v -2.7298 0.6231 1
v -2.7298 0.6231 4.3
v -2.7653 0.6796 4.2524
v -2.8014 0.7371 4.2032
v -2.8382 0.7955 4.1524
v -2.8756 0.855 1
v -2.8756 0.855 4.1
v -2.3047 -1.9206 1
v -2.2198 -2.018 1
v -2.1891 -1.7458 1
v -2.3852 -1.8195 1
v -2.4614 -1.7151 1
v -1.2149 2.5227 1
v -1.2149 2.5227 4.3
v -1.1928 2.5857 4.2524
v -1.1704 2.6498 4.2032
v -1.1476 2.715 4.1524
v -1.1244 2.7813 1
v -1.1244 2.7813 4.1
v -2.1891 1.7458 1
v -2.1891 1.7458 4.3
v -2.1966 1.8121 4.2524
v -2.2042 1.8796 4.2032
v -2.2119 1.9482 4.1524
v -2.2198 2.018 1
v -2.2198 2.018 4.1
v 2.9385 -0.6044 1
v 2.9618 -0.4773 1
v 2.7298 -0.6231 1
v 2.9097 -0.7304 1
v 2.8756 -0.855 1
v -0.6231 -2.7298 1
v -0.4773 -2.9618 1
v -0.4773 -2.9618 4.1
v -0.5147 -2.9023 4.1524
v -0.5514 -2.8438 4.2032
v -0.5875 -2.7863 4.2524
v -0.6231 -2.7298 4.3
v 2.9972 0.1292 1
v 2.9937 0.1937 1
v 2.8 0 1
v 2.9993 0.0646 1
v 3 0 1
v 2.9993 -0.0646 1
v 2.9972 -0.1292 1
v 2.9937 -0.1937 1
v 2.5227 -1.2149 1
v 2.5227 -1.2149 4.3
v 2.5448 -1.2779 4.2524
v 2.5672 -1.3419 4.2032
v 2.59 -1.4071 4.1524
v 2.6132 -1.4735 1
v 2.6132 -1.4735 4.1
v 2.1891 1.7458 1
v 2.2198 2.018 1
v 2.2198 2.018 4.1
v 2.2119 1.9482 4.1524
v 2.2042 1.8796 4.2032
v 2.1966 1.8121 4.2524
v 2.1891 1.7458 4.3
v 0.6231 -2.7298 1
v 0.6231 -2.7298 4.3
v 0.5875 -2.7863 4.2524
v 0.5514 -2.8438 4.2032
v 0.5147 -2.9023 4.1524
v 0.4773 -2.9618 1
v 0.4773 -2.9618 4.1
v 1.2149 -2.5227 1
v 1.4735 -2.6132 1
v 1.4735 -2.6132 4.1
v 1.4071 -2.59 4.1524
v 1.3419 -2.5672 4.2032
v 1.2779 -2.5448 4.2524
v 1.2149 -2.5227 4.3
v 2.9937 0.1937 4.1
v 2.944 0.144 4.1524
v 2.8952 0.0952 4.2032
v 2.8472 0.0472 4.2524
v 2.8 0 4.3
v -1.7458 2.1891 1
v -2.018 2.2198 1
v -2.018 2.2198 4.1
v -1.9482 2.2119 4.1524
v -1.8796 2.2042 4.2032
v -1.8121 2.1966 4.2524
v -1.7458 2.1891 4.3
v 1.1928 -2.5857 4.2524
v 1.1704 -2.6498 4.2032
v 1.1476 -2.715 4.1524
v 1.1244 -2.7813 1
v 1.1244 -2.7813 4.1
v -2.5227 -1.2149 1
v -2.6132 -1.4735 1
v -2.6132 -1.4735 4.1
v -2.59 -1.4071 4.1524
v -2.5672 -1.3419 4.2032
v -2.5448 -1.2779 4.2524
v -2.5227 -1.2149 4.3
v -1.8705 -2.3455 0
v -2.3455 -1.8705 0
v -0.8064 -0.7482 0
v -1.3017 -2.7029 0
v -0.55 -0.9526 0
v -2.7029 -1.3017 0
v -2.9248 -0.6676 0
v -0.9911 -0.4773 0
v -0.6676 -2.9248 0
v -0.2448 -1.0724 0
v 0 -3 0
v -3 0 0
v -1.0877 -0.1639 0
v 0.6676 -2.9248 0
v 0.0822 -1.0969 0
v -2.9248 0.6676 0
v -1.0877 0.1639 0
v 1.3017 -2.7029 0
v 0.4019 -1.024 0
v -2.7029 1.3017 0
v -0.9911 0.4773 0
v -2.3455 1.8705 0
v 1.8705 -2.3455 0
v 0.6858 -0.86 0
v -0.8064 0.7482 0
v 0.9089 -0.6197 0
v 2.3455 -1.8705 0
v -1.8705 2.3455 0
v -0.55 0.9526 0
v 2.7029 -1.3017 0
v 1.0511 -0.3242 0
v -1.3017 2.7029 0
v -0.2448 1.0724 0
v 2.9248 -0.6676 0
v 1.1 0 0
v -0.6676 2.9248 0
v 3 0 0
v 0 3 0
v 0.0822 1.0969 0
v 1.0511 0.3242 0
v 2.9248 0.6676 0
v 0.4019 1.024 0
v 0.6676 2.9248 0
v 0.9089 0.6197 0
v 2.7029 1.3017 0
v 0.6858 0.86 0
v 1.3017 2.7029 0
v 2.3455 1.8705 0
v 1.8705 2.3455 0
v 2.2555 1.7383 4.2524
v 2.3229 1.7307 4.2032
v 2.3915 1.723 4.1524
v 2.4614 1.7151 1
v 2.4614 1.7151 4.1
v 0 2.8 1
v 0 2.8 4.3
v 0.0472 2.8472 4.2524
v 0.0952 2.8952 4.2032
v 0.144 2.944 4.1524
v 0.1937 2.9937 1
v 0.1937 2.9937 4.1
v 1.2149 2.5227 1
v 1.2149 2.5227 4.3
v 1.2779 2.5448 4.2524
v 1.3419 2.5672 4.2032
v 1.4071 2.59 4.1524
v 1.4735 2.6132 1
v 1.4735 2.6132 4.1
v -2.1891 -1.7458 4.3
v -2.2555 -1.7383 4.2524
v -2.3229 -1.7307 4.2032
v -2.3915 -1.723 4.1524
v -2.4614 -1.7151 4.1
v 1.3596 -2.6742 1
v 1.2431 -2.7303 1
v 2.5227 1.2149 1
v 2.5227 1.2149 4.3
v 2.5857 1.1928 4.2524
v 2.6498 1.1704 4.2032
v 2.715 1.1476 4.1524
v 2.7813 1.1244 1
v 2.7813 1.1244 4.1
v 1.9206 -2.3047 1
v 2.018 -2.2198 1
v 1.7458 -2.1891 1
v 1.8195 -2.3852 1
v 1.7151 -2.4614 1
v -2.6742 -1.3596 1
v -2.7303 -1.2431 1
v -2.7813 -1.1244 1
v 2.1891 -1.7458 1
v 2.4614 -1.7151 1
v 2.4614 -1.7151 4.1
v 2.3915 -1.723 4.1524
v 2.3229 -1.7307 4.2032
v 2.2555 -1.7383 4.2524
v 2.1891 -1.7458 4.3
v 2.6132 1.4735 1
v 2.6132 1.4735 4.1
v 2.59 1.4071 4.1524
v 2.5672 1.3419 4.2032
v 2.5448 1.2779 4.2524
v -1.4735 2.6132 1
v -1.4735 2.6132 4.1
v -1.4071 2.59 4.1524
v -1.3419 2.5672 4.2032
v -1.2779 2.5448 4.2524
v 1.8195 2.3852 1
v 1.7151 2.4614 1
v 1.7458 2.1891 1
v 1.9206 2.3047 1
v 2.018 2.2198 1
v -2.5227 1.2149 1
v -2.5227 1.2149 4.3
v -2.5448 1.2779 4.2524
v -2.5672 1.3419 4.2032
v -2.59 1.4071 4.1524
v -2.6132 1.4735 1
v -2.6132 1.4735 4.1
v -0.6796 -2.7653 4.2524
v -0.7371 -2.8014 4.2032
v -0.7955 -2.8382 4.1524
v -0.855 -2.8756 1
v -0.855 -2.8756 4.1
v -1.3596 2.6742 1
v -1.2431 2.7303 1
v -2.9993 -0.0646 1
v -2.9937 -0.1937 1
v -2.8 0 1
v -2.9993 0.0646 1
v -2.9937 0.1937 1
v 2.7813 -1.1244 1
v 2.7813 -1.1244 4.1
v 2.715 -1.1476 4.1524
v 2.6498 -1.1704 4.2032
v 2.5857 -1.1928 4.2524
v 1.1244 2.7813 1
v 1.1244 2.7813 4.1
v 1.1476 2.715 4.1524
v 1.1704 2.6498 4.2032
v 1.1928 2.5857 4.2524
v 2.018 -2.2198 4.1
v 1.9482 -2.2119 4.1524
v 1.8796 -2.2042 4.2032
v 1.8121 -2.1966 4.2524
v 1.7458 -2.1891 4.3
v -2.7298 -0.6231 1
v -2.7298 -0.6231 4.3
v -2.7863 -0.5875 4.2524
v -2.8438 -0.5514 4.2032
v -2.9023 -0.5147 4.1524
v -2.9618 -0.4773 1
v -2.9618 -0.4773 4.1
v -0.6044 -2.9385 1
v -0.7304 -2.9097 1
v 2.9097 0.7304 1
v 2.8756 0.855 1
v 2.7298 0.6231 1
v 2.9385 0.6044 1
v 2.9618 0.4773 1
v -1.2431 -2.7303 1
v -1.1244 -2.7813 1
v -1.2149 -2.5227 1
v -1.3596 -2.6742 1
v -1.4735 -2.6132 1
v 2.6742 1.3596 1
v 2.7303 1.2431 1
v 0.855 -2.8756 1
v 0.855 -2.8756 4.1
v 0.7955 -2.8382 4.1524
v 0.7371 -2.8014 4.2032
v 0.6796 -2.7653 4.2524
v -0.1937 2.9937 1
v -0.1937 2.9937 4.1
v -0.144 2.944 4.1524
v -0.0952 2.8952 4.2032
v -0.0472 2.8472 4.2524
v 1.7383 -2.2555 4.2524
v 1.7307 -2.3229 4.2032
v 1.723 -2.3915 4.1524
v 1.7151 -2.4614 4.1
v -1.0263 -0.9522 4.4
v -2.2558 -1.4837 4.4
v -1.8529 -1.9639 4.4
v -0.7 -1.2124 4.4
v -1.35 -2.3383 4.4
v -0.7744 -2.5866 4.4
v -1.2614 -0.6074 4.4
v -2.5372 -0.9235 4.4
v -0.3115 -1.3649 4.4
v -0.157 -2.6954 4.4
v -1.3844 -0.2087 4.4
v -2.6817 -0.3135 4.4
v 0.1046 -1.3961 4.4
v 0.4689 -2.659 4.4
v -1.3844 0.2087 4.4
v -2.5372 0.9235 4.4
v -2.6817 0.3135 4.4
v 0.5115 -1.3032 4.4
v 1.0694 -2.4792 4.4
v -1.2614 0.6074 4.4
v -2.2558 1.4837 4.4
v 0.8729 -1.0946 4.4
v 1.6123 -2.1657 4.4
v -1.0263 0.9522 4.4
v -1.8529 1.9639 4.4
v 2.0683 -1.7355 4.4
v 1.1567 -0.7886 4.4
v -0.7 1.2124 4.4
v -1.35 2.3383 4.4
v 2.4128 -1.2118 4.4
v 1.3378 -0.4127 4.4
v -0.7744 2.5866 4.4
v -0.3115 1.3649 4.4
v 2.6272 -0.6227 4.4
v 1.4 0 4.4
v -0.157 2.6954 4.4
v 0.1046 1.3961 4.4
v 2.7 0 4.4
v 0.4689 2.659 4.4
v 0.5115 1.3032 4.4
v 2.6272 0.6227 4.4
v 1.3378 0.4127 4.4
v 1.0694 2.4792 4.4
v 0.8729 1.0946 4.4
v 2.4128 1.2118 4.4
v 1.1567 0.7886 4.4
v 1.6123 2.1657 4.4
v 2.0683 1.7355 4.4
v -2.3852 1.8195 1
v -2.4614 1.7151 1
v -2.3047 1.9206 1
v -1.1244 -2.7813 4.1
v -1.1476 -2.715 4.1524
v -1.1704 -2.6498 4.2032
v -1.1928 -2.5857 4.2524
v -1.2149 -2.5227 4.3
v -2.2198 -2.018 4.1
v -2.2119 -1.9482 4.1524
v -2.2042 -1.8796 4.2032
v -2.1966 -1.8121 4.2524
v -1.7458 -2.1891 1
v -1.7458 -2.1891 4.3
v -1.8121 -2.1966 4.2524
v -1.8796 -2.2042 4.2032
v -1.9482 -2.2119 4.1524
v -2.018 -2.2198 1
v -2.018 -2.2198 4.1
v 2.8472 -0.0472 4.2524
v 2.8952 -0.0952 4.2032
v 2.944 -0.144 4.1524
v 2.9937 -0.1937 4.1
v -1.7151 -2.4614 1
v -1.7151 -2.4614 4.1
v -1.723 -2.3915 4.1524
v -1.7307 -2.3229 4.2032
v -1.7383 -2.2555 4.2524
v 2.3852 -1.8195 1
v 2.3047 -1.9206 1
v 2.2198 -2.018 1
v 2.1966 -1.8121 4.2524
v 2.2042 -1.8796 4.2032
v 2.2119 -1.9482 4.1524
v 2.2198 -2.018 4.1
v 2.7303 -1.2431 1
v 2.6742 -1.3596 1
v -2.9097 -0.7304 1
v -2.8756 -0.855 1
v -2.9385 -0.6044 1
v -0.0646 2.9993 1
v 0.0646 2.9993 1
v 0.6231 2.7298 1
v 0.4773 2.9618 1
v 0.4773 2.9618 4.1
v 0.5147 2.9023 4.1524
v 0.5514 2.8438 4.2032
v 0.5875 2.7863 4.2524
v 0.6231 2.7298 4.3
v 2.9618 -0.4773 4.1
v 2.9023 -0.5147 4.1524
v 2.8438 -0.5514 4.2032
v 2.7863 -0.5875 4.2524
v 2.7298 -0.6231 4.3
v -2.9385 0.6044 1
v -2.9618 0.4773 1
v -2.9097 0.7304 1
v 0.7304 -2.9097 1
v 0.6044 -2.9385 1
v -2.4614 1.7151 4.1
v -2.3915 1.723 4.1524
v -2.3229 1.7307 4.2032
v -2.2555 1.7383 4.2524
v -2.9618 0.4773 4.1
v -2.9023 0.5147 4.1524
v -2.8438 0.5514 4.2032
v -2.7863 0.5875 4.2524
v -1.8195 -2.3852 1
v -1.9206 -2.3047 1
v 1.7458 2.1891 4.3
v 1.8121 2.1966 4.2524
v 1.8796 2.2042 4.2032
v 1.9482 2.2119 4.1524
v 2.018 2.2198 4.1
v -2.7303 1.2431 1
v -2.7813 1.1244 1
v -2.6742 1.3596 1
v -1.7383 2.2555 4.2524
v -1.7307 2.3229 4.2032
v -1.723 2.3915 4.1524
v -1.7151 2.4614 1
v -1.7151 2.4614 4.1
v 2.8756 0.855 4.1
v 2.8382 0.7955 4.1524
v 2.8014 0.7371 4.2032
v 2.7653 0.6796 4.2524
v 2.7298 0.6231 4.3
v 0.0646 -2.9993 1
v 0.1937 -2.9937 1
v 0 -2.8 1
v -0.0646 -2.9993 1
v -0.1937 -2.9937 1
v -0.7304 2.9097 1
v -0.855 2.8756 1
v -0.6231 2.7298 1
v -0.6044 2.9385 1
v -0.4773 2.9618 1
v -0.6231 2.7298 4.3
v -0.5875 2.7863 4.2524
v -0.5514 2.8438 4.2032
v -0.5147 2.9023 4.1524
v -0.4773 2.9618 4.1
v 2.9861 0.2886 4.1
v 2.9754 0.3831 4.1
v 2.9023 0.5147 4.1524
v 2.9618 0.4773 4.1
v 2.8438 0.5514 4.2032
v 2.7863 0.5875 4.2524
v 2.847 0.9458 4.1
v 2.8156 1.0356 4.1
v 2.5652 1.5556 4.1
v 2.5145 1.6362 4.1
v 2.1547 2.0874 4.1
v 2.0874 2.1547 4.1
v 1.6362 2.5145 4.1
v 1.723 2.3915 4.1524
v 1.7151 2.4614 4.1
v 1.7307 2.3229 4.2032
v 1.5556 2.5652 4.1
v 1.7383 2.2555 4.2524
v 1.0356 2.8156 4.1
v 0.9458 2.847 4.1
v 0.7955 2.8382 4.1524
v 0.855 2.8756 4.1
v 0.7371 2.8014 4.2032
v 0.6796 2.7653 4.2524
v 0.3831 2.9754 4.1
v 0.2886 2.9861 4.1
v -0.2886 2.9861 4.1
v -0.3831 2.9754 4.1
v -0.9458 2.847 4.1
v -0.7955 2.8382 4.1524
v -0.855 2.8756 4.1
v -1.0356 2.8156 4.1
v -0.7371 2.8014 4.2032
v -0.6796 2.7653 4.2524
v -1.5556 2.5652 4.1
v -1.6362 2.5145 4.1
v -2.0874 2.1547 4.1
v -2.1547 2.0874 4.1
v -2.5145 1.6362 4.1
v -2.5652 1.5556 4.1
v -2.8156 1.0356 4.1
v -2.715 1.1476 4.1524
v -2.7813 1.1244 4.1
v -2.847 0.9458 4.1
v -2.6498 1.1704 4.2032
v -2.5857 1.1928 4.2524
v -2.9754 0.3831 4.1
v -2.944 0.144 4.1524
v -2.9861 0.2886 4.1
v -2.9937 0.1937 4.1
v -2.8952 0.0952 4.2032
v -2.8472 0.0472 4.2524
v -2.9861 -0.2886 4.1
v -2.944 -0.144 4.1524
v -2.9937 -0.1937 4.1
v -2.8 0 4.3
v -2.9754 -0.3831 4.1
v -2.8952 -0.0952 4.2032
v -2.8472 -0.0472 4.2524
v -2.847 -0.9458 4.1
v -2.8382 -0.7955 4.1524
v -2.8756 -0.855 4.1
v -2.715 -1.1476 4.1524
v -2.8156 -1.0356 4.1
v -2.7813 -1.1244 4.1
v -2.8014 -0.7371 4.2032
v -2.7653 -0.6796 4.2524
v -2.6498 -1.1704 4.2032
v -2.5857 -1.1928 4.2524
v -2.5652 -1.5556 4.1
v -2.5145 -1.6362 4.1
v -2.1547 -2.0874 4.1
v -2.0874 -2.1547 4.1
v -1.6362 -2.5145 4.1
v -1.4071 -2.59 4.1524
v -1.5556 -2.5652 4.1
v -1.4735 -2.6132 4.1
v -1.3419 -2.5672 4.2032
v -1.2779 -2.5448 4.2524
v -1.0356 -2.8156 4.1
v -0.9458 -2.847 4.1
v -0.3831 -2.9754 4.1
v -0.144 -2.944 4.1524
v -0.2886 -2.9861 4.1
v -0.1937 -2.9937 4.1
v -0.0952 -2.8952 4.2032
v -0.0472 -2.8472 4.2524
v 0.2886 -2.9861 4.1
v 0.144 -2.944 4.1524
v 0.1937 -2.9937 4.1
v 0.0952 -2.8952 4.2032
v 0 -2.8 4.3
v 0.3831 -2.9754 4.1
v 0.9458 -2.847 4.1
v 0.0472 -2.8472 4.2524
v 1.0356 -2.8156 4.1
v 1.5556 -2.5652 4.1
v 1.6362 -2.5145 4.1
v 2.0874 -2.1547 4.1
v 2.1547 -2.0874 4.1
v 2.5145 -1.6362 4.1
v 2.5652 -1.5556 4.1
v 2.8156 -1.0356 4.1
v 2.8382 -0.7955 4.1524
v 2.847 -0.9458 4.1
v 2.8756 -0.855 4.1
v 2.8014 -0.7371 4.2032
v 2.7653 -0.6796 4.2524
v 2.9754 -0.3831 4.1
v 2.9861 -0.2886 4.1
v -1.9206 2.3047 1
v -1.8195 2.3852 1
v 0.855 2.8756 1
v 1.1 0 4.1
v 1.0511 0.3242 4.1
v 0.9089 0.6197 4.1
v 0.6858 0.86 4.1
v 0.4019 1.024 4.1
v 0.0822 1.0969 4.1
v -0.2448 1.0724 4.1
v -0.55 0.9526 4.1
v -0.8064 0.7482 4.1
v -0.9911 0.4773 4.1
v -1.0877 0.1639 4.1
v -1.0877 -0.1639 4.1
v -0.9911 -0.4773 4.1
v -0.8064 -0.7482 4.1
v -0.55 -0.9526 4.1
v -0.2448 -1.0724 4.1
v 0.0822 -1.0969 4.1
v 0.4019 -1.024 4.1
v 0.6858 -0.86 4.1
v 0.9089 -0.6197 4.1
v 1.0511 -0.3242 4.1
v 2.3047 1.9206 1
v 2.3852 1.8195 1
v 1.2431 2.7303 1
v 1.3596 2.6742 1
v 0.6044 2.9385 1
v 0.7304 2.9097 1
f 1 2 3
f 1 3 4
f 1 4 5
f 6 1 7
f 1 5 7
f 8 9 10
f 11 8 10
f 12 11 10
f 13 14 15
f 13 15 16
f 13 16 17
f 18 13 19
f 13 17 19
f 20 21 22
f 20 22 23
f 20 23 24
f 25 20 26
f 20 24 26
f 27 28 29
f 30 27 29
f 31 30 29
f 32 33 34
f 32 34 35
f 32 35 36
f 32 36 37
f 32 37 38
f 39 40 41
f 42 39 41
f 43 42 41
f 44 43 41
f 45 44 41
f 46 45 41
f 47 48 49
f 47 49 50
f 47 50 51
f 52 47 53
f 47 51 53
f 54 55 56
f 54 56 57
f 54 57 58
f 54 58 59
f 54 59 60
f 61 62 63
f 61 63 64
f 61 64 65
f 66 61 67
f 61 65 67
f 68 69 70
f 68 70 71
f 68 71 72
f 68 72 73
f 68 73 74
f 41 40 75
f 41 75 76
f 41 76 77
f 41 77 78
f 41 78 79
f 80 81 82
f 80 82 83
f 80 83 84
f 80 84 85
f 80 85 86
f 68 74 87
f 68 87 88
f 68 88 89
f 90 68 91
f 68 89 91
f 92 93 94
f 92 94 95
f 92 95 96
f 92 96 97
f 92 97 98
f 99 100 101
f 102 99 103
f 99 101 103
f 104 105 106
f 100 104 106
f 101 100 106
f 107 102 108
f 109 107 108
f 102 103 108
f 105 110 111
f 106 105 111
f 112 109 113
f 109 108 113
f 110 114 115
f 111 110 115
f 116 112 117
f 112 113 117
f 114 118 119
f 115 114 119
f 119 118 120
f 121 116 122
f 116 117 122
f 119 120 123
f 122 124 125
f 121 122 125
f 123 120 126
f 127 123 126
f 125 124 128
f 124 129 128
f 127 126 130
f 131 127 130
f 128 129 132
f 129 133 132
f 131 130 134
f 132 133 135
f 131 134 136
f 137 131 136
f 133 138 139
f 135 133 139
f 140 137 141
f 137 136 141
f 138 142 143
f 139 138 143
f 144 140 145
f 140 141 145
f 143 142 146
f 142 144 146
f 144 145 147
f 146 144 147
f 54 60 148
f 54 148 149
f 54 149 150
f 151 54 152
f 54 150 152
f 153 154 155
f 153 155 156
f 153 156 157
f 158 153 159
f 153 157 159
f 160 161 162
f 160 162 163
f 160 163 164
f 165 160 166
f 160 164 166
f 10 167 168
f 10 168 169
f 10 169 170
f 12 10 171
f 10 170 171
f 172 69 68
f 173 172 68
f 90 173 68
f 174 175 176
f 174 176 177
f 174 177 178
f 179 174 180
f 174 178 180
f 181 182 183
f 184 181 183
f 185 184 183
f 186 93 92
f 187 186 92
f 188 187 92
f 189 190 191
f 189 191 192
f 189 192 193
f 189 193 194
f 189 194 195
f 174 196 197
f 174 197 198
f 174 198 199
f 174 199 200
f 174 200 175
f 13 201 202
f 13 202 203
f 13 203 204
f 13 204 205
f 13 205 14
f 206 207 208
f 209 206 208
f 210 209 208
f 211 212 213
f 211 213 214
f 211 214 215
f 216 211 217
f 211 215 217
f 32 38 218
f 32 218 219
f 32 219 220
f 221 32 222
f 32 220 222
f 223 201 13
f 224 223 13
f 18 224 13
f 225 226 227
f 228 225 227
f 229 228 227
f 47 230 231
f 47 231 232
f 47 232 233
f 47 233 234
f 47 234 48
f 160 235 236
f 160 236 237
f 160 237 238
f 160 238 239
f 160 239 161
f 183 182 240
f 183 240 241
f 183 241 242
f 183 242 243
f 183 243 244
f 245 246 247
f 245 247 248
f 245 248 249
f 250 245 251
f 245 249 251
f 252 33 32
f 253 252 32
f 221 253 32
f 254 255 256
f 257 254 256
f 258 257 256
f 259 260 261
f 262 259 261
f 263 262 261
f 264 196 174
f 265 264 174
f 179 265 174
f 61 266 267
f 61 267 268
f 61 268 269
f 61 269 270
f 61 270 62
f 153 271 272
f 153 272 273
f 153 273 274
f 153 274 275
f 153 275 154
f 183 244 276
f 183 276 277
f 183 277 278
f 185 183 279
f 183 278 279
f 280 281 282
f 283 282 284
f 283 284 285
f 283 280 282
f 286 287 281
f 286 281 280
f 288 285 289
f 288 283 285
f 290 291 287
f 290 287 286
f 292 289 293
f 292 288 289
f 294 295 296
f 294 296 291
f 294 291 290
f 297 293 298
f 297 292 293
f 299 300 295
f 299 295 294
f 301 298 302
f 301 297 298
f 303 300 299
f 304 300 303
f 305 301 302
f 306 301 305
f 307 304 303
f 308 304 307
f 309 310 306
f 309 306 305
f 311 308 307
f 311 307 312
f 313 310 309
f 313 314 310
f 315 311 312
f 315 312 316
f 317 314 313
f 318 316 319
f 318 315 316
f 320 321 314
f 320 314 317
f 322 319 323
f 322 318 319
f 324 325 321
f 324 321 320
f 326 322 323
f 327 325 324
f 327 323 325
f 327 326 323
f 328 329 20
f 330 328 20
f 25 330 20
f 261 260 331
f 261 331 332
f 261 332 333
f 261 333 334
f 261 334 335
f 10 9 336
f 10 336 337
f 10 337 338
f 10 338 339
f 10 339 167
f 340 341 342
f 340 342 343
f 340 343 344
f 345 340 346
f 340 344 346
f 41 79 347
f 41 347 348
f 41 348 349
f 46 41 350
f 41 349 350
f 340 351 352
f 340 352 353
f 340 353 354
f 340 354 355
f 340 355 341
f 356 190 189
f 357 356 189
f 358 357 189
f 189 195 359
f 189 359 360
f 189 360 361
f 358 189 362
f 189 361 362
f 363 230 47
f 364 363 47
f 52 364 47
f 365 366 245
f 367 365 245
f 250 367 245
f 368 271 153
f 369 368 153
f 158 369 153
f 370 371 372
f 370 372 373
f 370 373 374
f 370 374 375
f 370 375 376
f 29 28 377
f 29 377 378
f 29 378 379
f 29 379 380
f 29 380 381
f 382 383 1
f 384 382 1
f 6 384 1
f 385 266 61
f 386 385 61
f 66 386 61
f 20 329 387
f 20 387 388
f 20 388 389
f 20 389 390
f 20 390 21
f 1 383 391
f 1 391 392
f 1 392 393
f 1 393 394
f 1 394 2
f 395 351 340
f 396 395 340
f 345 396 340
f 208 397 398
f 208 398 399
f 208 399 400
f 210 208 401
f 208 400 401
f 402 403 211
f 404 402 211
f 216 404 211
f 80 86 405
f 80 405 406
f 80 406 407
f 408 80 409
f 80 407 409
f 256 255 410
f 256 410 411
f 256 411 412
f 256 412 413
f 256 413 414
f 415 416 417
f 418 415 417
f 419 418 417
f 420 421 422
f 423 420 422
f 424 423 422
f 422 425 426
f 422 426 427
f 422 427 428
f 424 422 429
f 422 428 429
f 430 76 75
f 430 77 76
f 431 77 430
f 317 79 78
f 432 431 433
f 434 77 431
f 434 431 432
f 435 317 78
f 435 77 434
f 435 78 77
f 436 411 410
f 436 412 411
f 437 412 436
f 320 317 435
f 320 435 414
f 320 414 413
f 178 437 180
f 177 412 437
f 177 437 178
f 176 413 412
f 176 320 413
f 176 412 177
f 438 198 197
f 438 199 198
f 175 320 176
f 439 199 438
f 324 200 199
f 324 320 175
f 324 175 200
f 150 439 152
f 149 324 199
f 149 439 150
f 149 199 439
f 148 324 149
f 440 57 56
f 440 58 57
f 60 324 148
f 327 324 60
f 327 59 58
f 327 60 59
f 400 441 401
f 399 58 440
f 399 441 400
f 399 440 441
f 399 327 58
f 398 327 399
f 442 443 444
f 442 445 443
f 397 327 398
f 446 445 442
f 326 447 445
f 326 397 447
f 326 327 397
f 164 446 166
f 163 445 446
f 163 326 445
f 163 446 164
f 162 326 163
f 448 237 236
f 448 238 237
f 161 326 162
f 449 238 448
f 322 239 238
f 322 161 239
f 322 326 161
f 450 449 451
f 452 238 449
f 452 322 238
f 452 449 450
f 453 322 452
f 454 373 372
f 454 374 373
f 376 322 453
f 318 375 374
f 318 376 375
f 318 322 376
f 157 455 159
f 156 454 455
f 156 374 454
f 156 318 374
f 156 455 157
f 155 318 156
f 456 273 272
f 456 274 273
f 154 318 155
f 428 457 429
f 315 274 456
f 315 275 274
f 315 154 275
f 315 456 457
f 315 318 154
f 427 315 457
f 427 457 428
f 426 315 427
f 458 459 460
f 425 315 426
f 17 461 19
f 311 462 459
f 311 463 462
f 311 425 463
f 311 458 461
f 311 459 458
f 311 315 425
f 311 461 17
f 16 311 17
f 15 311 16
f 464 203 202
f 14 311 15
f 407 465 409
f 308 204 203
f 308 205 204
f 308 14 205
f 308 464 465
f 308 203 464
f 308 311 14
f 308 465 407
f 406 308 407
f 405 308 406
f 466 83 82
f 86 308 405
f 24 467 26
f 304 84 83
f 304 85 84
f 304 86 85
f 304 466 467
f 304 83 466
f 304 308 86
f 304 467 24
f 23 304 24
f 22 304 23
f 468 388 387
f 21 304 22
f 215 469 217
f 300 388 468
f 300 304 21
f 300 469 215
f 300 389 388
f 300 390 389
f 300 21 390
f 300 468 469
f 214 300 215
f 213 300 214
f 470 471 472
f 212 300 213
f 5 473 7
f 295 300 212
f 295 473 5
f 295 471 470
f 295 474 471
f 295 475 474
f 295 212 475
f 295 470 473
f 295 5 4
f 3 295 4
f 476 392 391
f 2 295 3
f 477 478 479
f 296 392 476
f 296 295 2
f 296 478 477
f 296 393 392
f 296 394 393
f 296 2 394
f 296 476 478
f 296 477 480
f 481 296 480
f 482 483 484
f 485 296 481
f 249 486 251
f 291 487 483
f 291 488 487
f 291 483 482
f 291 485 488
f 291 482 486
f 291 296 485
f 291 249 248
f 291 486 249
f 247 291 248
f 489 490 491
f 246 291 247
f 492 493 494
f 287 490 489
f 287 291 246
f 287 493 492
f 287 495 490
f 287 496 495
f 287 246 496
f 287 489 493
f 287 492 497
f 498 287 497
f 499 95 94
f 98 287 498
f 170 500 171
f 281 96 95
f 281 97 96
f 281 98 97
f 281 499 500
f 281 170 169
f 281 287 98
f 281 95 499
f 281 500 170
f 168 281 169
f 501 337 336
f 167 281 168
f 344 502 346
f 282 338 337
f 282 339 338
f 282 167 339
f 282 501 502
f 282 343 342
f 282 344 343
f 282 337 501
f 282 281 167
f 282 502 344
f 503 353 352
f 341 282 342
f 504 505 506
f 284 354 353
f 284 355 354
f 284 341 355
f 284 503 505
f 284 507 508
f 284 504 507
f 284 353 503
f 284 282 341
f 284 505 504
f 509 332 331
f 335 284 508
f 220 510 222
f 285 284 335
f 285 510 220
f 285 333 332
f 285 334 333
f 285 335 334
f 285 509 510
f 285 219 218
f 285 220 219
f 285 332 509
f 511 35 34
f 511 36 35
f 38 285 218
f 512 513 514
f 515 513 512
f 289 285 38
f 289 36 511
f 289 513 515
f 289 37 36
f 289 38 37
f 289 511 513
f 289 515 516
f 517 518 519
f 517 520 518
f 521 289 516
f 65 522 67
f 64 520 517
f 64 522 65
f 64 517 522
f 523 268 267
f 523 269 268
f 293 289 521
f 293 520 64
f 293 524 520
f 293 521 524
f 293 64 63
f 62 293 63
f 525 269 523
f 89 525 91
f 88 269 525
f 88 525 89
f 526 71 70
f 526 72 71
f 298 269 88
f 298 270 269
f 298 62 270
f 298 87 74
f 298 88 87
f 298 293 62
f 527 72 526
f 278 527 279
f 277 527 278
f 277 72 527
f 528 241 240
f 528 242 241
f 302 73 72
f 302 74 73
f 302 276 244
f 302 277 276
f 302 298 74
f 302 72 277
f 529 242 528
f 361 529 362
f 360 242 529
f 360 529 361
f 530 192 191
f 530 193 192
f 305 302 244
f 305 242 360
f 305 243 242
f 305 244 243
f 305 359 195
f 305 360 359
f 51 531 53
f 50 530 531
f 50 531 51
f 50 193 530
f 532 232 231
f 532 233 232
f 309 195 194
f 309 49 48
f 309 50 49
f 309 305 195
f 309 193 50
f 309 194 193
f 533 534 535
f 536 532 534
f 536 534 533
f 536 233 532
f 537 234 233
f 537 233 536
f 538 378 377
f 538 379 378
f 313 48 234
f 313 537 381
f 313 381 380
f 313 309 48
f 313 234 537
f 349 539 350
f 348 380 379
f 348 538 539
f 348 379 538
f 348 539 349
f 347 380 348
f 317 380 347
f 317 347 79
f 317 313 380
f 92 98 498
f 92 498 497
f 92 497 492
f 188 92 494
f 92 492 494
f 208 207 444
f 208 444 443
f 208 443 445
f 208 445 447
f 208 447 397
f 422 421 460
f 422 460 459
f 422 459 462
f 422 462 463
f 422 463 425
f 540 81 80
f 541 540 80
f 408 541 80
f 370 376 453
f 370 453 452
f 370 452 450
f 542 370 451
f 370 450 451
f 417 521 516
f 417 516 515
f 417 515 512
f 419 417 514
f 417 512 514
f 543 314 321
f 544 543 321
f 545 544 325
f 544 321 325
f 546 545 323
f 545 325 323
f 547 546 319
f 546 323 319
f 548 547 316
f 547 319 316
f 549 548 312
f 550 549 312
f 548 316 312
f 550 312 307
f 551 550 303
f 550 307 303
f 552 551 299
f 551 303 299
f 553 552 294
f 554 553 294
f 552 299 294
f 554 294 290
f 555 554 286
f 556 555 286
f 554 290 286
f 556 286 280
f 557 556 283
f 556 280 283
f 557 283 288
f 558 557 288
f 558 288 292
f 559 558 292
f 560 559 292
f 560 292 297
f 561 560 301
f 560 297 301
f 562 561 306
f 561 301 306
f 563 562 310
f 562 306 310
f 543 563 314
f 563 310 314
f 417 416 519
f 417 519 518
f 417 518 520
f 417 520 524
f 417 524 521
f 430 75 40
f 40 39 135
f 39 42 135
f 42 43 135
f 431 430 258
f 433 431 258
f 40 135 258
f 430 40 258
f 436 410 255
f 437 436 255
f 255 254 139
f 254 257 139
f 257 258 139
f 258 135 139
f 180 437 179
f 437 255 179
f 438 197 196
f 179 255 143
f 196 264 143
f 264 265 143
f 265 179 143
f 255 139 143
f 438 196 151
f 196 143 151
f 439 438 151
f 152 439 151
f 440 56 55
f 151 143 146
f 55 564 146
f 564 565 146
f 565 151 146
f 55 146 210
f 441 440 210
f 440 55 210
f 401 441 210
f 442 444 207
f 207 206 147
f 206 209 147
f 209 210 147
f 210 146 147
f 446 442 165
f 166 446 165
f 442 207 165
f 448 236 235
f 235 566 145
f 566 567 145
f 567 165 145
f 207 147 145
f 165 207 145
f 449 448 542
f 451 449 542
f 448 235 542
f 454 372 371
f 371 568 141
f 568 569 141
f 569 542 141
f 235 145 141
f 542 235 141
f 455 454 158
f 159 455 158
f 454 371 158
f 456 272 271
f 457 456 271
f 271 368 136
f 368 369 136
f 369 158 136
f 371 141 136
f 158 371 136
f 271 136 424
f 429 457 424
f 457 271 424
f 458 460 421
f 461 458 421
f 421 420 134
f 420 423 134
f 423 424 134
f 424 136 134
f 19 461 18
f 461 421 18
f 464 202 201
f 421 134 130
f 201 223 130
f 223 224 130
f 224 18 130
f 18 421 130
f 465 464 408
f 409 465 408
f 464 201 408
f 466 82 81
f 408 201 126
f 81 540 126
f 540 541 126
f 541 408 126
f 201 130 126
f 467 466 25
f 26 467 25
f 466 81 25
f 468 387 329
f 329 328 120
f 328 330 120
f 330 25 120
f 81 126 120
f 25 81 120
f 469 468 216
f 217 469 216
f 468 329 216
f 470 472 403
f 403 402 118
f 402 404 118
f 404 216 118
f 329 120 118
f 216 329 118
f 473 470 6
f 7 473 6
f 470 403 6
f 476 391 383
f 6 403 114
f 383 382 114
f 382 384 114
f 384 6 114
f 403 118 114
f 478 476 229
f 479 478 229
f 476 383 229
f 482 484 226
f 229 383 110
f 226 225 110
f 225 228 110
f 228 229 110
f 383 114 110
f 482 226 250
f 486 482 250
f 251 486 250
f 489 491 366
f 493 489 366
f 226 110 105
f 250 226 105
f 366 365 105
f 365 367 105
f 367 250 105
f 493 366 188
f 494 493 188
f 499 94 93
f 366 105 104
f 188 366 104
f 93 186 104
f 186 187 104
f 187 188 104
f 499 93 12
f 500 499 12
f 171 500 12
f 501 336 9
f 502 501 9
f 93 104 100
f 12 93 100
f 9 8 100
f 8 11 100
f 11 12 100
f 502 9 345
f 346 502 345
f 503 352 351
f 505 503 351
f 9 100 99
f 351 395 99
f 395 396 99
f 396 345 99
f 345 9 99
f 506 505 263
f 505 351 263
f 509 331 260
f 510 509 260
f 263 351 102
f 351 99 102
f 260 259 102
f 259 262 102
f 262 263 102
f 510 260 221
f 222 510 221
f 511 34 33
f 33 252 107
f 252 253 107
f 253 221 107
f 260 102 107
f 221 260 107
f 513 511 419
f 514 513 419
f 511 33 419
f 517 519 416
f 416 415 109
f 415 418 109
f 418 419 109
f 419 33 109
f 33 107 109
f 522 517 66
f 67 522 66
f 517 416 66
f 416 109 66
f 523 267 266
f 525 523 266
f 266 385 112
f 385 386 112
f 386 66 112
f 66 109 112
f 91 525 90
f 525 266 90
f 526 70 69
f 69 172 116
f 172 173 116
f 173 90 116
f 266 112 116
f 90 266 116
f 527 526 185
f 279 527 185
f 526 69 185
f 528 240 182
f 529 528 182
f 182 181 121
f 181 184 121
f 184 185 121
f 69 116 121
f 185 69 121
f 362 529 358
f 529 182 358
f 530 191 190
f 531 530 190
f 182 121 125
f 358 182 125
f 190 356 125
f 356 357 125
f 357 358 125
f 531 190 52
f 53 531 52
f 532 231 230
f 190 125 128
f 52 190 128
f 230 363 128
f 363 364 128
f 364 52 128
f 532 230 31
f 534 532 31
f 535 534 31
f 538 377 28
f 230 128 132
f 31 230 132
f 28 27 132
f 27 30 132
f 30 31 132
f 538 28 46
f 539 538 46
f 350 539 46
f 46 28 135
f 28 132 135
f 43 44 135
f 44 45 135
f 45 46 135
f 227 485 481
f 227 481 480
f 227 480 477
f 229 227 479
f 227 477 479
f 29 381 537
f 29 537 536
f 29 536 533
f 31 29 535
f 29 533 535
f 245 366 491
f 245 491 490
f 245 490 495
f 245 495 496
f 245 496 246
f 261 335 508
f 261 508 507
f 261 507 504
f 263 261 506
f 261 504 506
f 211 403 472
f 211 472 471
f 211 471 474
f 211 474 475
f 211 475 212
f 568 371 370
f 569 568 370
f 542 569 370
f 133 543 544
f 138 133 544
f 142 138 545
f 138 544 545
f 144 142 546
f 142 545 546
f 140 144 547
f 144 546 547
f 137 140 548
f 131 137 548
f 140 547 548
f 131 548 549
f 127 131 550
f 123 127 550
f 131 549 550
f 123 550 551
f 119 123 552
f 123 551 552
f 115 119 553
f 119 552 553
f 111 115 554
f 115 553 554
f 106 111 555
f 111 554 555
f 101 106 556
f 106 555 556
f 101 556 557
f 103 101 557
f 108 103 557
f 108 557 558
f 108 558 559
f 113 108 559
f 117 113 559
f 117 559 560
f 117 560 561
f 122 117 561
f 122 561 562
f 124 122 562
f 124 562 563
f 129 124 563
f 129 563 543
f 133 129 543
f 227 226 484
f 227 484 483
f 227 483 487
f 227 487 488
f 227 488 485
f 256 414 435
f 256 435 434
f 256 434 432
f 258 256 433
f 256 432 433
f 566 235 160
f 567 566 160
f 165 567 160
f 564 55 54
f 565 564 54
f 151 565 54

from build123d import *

# Parameters (mm, degrees)
SKETCH026_R                 = 3
PAD002001003004001006_DEPTH = 4.4
SKETCH027_R                 = 1.1
POCKET011_DEPTH             = 4.401
CHAMFER_SIZE                = 0.3
POCKET012_DEPTH             = 3.4
POLARPATTERN_COUNT          = 28
CHAMFER001_SIZE             = 0.3


with BuildPart() as part:
    # Sketch026 → Pad002001003004001006 (new body)
    with BuildSketch(Plane.XY):
        Circle(SKETCH026_R)
    extrude(amount=PAD002001003004001006_DEPTH)

    # Sketch027 (on Face3 of Pad002001003004001006) → Pocket011 (cut, through all)
    with BuildSketch(Plane.XY.offset(4.4)):
        Circle(SKETCH027_R)
    extrude(amount=-POCKET011_DEPTH, mode=Mode.SUBTRACT)

    # Chamfer
    chamfer_edges = [part.edges().sort_by_distance(p)[0] for p in [
        (-3, 0, 4.4),
    ]]
    chamfer(chamfer_edges, length=CHAMFER_SIZE)

    # Sketch028 (on Face4 of Chamfer) → Pocket012 (cut)
    with BuildSketch(Plane.XY.offset(4.4)):
        Polygon((-0.2, 3), (0, 2.8), (0.2, 3), align=None)
    pocket012 = extrude(amount=-POCKET012_DEPTH, mode=Mode.SUBTRACT)

    # PolarPattern: Pocket012 ×28 about axis
    polarpattern_axis = Axis((0, 0, 4.4), (0, 0, 1))
    for i in range(1, POLARPATTERN_COUNT):
        add(pocket012.rotate(polarpattern_axis, i * 360 / POLARPATTERN_COUNT), mode=Mode.SUBTRACT)

    # Chamfer001
    chamfer001_edges = [part.edges().sort_by_distance(p)[0] for p in [
        (-1.1, 0, 4.4),
    ]]
    chamfer(chamfer001_edges, length=CHAMFER001_SIZE)


solid = part.part
